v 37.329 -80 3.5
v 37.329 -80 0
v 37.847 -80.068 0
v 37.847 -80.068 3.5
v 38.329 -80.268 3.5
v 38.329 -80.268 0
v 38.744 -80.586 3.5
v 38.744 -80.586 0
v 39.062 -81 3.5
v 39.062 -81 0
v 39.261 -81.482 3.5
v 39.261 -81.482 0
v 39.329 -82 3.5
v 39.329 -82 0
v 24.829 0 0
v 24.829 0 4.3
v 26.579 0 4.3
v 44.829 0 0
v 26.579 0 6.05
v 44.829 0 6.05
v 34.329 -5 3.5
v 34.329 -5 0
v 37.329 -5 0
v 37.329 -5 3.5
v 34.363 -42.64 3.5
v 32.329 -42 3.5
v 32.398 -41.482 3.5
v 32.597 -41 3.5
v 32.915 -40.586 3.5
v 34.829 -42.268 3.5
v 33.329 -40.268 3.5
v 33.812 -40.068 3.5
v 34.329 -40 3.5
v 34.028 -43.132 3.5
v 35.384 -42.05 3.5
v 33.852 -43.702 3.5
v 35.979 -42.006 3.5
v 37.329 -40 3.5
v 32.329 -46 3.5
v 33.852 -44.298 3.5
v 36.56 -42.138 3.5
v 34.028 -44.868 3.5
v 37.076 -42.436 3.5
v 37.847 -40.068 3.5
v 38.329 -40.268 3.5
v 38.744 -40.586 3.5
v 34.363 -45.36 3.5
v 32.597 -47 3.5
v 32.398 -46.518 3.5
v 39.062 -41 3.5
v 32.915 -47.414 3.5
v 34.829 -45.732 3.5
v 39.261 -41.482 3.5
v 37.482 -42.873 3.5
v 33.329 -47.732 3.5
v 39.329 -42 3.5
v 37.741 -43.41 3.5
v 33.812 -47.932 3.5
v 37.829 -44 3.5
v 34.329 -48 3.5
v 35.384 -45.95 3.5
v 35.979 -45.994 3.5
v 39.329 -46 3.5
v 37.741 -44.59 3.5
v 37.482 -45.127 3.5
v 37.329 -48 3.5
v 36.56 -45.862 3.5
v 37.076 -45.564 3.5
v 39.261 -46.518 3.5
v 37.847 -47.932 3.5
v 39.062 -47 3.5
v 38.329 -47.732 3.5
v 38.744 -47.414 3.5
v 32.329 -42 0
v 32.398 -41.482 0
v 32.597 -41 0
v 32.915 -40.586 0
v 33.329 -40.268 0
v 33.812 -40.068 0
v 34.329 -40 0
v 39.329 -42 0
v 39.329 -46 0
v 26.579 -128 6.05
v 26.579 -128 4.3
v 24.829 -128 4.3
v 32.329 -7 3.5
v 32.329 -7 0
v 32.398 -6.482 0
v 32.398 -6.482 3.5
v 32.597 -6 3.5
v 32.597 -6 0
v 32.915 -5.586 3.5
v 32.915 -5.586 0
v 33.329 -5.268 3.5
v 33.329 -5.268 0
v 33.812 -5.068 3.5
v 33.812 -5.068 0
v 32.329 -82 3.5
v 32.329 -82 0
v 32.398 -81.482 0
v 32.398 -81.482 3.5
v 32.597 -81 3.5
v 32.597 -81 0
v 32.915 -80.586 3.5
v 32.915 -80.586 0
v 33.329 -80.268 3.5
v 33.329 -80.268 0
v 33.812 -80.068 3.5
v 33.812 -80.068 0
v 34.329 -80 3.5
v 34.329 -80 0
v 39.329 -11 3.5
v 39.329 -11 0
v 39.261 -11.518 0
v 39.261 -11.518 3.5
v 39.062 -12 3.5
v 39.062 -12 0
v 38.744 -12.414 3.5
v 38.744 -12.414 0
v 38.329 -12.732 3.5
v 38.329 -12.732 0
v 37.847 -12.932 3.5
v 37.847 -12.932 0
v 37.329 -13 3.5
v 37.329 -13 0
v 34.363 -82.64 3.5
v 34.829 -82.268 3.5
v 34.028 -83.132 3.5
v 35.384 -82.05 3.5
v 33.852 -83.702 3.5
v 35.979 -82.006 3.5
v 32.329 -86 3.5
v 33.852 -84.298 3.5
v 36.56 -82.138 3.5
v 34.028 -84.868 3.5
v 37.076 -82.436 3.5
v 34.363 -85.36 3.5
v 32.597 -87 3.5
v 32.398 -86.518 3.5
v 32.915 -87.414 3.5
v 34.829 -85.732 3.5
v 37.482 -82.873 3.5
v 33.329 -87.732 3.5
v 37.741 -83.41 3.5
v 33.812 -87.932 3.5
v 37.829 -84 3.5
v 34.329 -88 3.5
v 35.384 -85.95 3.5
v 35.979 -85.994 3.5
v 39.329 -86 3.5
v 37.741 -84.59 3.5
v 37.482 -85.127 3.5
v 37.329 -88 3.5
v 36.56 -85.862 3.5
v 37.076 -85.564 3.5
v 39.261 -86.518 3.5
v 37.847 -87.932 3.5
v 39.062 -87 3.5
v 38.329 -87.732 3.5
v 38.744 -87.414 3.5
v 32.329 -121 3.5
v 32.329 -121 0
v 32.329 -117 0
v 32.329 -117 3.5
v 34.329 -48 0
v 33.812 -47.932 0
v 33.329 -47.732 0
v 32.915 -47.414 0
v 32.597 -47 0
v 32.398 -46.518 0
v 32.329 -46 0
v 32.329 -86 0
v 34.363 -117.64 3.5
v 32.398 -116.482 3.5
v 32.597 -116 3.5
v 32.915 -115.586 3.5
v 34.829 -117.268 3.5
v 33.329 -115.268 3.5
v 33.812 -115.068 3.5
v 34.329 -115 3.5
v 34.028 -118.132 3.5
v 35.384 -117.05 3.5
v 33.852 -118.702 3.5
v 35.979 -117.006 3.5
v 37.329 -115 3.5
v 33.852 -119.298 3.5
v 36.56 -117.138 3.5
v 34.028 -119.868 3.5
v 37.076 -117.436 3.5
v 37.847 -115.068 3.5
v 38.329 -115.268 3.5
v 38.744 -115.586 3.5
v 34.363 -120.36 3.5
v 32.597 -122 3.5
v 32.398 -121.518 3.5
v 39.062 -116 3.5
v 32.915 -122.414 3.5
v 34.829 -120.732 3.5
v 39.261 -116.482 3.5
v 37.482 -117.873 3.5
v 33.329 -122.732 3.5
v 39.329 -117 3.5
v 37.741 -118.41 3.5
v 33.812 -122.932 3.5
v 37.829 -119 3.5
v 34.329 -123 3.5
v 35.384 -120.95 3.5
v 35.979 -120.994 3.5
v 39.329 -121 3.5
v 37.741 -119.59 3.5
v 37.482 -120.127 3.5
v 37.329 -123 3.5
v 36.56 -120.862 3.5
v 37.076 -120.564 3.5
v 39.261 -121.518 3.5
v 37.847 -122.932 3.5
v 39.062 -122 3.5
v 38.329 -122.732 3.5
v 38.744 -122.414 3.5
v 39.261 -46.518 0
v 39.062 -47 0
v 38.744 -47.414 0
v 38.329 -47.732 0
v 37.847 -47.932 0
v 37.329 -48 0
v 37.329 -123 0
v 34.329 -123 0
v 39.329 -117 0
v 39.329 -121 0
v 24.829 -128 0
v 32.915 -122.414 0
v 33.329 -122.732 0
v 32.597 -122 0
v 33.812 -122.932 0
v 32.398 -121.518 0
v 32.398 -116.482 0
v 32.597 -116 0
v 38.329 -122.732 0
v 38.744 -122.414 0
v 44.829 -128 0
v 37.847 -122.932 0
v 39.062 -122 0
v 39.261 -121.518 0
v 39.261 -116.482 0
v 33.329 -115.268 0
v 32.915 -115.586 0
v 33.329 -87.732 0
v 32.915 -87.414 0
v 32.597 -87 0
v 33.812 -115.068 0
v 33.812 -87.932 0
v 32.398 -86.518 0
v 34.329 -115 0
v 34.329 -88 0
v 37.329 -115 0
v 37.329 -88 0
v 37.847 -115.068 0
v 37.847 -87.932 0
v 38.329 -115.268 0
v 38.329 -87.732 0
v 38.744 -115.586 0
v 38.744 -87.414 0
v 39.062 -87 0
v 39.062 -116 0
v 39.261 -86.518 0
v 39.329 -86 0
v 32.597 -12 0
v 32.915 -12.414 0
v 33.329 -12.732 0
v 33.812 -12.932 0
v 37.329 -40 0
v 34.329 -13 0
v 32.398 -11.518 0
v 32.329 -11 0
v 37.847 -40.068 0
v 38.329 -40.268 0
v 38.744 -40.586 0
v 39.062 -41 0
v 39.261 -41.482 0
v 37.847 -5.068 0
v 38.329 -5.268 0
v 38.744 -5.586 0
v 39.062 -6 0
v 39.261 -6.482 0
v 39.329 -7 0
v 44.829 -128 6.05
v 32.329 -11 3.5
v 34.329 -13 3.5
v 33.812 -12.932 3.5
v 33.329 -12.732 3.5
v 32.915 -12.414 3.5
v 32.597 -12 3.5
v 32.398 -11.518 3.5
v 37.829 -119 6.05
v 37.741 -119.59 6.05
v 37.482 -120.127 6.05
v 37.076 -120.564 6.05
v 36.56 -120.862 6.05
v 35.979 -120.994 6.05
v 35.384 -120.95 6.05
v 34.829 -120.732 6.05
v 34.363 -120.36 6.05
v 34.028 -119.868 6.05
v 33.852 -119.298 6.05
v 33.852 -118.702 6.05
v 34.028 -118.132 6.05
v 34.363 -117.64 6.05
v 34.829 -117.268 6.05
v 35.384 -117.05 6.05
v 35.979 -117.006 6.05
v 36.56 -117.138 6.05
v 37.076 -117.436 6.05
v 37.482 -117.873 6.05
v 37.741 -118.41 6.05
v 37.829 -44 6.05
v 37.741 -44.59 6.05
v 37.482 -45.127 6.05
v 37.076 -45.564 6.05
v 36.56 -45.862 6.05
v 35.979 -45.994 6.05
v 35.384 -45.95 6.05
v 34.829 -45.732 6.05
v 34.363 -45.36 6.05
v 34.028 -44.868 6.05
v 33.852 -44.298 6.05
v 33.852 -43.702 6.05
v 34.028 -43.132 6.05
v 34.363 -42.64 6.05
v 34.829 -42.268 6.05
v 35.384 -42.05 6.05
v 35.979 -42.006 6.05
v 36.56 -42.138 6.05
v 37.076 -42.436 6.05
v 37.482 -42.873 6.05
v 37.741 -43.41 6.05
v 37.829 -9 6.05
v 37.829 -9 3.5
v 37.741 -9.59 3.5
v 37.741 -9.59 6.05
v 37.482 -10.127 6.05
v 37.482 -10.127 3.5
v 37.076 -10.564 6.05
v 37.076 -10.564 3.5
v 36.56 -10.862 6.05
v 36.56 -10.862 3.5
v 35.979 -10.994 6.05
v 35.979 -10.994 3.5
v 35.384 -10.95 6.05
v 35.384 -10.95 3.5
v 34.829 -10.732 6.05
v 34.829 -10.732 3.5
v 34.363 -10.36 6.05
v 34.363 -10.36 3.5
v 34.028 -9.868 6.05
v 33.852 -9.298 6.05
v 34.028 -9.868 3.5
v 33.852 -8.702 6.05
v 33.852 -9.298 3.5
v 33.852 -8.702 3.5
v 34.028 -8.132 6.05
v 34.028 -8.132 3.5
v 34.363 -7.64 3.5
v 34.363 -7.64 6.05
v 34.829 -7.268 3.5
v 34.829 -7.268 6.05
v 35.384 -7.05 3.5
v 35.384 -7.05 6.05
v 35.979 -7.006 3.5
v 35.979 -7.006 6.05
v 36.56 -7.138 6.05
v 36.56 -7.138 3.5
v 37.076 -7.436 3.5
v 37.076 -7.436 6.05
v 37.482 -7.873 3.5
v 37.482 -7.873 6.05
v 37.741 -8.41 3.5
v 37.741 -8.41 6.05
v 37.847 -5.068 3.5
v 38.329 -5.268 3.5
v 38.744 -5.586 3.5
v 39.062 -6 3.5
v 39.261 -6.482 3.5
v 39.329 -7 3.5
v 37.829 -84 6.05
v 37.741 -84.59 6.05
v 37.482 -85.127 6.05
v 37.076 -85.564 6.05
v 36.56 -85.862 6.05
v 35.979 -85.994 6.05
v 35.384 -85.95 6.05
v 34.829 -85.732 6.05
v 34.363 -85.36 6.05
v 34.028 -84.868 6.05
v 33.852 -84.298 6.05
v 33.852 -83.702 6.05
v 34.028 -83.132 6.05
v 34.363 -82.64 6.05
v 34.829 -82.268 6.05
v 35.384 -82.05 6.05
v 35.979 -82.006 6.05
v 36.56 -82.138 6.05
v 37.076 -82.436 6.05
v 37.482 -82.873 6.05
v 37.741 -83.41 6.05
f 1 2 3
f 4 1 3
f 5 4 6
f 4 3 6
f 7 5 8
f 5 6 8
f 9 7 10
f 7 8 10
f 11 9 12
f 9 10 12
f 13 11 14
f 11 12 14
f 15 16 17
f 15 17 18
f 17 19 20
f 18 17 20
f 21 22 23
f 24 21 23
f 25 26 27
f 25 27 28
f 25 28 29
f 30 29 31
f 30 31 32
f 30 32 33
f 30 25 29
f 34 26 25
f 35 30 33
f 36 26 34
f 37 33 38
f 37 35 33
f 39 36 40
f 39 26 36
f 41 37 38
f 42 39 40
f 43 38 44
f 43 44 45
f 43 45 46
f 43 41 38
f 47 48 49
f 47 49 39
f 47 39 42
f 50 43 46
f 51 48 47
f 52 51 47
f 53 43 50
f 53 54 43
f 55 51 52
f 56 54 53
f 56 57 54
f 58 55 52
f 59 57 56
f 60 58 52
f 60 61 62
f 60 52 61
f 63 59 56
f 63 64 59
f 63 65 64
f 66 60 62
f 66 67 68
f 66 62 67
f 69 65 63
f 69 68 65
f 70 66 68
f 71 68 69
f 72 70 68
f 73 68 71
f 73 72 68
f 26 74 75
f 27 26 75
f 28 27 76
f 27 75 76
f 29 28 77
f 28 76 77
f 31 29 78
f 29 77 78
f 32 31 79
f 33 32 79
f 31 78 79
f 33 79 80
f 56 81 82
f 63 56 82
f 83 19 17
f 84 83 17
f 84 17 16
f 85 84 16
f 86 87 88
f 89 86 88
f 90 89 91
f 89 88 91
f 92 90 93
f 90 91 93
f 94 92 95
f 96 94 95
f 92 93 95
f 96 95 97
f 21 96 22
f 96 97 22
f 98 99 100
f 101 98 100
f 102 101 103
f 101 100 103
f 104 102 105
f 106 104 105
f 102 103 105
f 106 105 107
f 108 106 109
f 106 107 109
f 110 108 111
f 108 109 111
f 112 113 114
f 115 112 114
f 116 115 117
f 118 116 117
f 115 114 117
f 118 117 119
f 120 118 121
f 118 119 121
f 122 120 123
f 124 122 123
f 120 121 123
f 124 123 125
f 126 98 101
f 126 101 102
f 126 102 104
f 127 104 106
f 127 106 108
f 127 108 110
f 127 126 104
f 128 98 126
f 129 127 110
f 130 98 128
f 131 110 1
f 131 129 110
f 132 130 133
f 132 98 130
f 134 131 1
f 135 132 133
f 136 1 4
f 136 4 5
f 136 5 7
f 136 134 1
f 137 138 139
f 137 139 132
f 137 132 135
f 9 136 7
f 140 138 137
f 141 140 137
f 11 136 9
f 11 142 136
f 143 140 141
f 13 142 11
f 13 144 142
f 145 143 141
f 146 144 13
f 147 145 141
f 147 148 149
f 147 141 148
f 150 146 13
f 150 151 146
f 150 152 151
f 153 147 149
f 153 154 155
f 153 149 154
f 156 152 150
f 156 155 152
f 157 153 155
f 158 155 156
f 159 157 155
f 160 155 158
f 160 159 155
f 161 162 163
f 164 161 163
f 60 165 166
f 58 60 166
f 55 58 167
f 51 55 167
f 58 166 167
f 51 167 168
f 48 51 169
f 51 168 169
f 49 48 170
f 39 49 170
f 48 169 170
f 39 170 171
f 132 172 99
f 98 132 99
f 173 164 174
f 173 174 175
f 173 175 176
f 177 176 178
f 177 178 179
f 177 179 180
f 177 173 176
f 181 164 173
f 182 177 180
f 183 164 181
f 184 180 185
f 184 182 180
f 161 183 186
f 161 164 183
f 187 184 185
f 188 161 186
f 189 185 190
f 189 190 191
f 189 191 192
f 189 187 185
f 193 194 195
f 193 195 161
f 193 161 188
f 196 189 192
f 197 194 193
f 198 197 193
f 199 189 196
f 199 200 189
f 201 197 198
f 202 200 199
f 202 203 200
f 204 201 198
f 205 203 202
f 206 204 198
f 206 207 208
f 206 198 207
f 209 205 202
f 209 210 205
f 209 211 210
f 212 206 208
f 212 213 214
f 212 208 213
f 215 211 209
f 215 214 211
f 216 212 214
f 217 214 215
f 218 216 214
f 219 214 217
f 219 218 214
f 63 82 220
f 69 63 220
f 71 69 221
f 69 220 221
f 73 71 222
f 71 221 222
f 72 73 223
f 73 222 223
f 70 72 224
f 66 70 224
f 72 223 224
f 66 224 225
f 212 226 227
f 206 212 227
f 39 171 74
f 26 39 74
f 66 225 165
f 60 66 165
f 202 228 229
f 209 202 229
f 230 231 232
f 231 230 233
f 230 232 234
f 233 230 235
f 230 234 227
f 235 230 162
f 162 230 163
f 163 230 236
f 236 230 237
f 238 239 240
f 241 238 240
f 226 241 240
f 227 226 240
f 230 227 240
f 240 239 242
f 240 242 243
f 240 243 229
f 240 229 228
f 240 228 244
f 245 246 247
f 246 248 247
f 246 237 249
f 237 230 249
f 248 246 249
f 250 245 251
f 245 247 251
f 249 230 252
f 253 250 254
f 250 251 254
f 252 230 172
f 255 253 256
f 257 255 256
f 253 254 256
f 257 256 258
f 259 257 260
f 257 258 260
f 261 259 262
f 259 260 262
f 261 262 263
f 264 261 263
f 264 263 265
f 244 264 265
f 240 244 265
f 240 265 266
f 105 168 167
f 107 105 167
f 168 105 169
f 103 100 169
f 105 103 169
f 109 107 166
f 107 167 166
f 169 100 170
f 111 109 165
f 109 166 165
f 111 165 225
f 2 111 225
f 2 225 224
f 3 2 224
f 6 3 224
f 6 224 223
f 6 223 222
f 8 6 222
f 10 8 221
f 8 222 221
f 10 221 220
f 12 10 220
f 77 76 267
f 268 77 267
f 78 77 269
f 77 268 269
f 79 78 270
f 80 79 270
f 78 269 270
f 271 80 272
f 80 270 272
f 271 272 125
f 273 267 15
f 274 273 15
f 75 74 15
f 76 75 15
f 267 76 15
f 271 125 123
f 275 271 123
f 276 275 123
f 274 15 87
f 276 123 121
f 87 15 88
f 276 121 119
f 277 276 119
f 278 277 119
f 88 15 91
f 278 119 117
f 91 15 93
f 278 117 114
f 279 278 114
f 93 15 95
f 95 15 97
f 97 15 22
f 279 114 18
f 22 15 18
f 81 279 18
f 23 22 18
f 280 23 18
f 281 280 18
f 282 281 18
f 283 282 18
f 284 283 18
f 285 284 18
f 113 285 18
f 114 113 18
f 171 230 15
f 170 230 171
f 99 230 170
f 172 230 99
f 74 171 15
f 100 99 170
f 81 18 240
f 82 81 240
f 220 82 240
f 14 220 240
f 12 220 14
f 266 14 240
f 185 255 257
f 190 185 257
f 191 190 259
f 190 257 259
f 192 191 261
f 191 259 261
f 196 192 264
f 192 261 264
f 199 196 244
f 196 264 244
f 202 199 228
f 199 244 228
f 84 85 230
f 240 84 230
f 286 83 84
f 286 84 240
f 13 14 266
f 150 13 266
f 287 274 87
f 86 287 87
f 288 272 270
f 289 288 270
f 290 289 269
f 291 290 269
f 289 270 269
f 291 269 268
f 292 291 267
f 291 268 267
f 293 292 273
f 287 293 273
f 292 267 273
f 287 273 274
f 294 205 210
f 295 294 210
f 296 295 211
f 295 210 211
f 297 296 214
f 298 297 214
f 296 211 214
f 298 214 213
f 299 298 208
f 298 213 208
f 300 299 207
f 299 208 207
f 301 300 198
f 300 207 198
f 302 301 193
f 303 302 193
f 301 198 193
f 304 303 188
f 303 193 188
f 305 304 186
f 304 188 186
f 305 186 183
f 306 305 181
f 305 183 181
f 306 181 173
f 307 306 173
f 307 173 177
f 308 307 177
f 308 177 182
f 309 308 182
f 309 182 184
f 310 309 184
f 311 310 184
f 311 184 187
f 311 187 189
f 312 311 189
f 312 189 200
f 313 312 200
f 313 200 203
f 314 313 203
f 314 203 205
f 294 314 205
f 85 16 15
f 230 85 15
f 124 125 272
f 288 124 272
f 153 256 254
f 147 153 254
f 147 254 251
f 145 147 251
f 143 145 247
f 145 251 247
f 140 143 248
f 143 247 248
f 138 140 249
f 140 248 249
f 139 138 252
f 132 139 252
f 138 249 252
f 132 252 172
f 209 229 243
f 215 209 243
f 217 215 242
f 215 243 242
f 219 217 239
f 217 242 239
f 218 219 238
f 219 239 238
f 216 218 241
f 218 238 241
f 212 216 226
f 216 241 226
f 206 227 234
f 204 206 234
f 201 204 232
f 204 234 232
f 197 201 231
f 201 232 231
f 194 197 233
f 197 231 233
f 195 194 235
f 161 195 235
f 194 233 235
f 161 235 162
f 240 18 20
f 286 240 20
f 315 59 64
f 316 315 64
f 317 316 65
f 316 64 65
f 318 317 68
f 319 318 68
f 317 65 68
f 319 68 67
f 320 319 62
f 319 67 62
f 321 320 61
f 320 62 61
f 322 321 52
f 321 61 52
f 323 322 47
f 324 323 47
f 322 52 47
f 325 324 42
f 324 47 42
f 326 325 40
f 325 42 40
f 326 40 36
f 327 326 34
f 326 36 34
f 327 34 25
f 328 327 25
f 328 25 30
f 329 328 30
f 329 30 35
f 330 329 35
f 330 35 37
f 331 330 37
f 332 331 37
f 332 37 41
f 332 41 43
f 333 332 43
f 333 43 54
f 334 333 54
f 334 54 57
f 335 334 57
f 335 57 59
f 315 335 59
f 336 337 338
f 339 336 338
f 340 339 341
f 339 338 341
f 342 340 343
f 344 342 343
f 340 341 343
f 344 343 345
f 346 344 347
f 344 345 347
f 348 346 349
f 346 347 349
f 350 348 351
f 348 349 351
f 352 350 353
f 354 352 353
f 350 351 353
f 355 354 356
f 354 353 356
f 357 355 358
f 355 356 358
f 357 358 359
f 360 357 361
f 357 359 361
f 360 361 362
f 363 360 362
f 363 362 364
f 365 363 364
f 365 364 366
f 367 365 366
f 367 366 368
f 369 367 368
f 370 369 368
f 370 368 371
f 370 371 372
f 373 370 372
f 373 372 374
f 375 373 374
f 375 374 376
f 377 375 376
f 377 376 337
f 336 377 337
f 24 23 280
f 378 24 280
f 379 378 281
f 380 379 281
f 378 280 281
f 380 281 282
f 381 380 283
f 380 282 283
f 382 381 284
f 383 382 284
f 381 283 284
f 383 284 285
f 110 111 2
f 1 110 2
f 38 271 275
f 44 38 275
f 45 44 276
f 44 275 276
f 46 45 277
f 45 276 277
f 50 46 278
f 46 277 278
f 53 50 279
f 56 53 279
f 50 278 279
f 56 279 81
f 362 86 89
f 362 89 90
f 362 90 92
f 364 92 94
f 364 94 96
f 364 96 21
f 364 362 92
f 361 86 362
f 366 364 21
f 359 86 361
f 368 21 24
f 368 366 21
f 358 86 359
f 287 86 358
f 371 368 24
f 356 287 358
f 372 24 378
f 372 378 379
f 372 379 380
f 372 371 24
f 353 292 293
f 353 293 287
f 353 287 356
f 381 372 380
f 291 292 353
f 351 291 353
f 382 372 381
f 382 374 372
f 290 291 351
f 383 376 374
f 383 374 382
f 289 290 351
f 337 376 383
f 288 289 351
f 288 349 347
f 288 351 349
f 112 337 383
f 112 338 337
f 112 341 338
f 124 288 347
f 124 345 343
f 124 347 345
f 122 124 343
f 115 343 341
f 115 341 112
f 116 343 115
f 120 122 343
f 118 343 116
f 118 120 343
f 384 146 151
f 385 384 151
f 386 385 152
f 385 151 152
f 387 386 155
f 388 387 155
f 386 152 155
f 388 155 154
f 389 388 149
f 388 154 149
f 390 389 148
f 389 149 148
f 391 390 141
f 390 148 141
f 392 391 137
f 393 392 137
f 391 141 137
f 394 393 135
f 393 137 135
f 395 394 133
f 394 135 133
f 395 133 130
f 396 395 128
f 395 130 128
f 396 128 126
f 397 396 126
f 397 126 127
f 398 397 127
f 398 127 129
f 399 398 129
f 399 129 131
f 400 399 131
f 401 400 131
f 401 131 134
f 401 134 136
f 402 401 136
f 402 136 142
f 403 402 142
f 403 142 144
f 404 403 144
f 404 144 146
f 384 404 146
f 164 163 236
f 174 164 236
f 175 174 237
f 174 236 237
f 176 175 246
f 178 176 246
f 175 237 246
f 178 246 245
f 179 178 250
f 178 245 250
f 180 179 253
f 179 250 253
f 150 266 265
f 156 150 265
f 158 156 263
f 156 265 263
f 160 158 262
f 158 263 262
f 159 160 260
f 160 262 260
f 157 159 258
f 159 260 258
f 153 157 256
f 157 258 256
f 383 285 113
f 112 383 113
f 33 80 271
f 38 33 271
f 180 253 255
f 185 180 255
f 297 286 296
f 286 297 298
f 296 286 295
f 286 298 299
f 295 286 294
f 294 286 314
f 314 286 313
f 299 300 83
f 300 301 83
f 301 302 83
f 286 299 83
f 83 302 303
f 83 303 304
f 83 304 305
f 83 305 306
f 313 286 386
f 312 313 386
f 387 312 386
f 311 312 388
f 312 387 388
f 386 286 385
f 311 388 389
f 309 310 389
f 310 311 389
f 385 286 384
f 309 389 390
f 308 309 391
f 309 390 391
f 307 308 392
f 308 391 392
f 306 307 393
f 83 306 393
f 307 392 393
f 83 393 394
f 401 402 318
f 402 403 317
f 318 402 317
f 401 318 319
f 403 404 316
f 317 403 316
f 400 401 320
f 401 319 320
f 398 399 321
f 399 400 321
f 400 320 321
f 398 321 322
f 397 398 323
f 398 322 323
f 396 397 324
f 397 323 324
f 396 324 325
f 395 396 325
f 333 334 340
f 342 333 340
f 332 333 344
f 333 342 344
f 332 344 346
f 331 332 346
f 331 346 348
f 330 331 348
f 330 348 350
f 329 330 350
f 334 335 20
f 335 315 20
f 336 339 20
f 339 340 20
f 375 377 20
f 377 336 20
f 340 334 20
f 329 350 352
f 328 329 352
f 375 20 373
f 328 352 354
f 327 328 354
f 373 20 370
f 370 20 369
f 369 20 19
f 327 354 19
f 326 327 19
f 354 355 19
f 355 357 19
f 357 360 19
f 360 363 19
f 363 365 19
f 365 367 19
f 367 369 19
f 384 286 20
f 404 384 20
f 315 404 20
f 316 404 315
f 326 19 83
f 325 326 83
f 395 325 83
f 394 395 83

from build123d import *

# Parameters (mm, degrees)
F1_DEPTH = 128
F3_DEPTH = 3.5
F4_R     = 2
F5_DEPTH = 6.051


with BuildPart() as f1:
    # F0 (on Front) → F1 (new body)
    with BuildSketch(Plane.XZ):
        Polygon((24.829483, 0), (44.829483, 0), (44.829483, 6.05), (26.579483, 6.05), (26.579483, 4.3), (24.829483, 4.3), align=None)
    extrude(amount=F1_DEPTH)

    # F2 (on face) → F3 (cut)
    with BuildSketch(Plane(origin=(0, 0, 0), x_dir=(1, 0, 0), z_dir=(0, 0, -1))):
        with BuildLine():
            ThreePointArc((32.329483, 117), (32.91527, 115.585786), (34.329483, 115))
            Line((34.329483, 115), (37.329483, 115))
            ThreePointArc((37.329483, 115), (38.743697, 115.585786), (39.329483, 117))
            Line((39.329483, 117), (39.329483, 121))
            ThreePointArc((39.329483, 121), (38.743697, 122.414214), (37.329483, 123))
            Line((37.329483, 123), (34.329483, 123))
            ThreePointArc((34.329483, 123), (32.91527, 122.414214), (32.329483, 121))
            Line((32.329483, 121), (32.329483, 117))
        make_face()
        with BuildLine():
            ThreePointArc((32.329483, 82), (32.91527, 80.585786), (34.329483, 80))
            Line((34.329483, 80), (37.329483, 80))
            ThreePointArc((37.329483, 80), (38.743697, 80.585786), (39.329483, 82))
            Line((39.329483, 82), (39.329483, 86))
            ThreePointArc((39.329483, 86), (38.743697, 87.414214), (37.329483, 88))
            Line((37.329483, 88), (34.329483, 88))
            ThreePointArc((34.329483, 88), (32.91527, 87.414214), (32.329483, 86))
            Line((32.329483, 86), (32.329483, 82))
        make_face()
        with BuildLine():
            ThreePointArc((37.329483, 40), (38.743697, 40.585786), (39.329483, 42))
            Line((39.329483, 42), (39.329483, 46))
            ThreePointArc((39.329483, 46), (38.743697, 47.414214), (37.329483, 48))
            Line((37.329483, 48), (34.329483, 48))
            ThreePointArc((34.329483, 48), (32.91527, 47.414214), (32.329483, 46))
            Line((32.329483, 46), (32.329483, 42))
            ThreePointArc((32.329483, 42), (32.91527, 40.585786), (34.329483, 40))
            Line((34.329483, 40), (37.329483, 40))
        make_face()
        with BuildLine():
            ThreePointArc((37.329483, 5), (38.743697, 5.585786), (39.329483, 7))
            Line((39.329483, 7), (39.329483, 11))
            ThreePointArc((39.329483, 11), (38.743697, 12.414214), (37.329483, 13))
            Line((37.329483, 13), (34.329483, 13))
            ThreePointArc((34.329483, 13), (32.91527, 12.414214), (32.329483, 11))
            Line((32.329483, 11), (32.329483, 7))
            ThreePointArc((32.329483, 7), (32.91527, 5.585786), (34.329483, 5))
            Line((34.329483, 5), (37.329483, 5))
        make_face()
    extrude(amount=-F3_DEPTH, mode=Mode.SUBTRACT)

    # F4 (on face) → F5 (cut, through all)
    with BuildSketch(Plane(origin=(0, 0, 0), x_dir=(1, 0, 0), z_dir=(0, 0, -1))):
        with Locations((35.829483, 119)):
            Circle(F4_R)
        with Locations((35.829483, 84)):
            Circle(F4_R)
        with Locations((35.829483, 44)):
            Circle(F4_R)
        with Locations((35.829483, 9)):
            Circle(F4_R)
    extrude(amount=-F5_DEPTH, mode=Mode.SUBTRACT)


solid = f1.part
